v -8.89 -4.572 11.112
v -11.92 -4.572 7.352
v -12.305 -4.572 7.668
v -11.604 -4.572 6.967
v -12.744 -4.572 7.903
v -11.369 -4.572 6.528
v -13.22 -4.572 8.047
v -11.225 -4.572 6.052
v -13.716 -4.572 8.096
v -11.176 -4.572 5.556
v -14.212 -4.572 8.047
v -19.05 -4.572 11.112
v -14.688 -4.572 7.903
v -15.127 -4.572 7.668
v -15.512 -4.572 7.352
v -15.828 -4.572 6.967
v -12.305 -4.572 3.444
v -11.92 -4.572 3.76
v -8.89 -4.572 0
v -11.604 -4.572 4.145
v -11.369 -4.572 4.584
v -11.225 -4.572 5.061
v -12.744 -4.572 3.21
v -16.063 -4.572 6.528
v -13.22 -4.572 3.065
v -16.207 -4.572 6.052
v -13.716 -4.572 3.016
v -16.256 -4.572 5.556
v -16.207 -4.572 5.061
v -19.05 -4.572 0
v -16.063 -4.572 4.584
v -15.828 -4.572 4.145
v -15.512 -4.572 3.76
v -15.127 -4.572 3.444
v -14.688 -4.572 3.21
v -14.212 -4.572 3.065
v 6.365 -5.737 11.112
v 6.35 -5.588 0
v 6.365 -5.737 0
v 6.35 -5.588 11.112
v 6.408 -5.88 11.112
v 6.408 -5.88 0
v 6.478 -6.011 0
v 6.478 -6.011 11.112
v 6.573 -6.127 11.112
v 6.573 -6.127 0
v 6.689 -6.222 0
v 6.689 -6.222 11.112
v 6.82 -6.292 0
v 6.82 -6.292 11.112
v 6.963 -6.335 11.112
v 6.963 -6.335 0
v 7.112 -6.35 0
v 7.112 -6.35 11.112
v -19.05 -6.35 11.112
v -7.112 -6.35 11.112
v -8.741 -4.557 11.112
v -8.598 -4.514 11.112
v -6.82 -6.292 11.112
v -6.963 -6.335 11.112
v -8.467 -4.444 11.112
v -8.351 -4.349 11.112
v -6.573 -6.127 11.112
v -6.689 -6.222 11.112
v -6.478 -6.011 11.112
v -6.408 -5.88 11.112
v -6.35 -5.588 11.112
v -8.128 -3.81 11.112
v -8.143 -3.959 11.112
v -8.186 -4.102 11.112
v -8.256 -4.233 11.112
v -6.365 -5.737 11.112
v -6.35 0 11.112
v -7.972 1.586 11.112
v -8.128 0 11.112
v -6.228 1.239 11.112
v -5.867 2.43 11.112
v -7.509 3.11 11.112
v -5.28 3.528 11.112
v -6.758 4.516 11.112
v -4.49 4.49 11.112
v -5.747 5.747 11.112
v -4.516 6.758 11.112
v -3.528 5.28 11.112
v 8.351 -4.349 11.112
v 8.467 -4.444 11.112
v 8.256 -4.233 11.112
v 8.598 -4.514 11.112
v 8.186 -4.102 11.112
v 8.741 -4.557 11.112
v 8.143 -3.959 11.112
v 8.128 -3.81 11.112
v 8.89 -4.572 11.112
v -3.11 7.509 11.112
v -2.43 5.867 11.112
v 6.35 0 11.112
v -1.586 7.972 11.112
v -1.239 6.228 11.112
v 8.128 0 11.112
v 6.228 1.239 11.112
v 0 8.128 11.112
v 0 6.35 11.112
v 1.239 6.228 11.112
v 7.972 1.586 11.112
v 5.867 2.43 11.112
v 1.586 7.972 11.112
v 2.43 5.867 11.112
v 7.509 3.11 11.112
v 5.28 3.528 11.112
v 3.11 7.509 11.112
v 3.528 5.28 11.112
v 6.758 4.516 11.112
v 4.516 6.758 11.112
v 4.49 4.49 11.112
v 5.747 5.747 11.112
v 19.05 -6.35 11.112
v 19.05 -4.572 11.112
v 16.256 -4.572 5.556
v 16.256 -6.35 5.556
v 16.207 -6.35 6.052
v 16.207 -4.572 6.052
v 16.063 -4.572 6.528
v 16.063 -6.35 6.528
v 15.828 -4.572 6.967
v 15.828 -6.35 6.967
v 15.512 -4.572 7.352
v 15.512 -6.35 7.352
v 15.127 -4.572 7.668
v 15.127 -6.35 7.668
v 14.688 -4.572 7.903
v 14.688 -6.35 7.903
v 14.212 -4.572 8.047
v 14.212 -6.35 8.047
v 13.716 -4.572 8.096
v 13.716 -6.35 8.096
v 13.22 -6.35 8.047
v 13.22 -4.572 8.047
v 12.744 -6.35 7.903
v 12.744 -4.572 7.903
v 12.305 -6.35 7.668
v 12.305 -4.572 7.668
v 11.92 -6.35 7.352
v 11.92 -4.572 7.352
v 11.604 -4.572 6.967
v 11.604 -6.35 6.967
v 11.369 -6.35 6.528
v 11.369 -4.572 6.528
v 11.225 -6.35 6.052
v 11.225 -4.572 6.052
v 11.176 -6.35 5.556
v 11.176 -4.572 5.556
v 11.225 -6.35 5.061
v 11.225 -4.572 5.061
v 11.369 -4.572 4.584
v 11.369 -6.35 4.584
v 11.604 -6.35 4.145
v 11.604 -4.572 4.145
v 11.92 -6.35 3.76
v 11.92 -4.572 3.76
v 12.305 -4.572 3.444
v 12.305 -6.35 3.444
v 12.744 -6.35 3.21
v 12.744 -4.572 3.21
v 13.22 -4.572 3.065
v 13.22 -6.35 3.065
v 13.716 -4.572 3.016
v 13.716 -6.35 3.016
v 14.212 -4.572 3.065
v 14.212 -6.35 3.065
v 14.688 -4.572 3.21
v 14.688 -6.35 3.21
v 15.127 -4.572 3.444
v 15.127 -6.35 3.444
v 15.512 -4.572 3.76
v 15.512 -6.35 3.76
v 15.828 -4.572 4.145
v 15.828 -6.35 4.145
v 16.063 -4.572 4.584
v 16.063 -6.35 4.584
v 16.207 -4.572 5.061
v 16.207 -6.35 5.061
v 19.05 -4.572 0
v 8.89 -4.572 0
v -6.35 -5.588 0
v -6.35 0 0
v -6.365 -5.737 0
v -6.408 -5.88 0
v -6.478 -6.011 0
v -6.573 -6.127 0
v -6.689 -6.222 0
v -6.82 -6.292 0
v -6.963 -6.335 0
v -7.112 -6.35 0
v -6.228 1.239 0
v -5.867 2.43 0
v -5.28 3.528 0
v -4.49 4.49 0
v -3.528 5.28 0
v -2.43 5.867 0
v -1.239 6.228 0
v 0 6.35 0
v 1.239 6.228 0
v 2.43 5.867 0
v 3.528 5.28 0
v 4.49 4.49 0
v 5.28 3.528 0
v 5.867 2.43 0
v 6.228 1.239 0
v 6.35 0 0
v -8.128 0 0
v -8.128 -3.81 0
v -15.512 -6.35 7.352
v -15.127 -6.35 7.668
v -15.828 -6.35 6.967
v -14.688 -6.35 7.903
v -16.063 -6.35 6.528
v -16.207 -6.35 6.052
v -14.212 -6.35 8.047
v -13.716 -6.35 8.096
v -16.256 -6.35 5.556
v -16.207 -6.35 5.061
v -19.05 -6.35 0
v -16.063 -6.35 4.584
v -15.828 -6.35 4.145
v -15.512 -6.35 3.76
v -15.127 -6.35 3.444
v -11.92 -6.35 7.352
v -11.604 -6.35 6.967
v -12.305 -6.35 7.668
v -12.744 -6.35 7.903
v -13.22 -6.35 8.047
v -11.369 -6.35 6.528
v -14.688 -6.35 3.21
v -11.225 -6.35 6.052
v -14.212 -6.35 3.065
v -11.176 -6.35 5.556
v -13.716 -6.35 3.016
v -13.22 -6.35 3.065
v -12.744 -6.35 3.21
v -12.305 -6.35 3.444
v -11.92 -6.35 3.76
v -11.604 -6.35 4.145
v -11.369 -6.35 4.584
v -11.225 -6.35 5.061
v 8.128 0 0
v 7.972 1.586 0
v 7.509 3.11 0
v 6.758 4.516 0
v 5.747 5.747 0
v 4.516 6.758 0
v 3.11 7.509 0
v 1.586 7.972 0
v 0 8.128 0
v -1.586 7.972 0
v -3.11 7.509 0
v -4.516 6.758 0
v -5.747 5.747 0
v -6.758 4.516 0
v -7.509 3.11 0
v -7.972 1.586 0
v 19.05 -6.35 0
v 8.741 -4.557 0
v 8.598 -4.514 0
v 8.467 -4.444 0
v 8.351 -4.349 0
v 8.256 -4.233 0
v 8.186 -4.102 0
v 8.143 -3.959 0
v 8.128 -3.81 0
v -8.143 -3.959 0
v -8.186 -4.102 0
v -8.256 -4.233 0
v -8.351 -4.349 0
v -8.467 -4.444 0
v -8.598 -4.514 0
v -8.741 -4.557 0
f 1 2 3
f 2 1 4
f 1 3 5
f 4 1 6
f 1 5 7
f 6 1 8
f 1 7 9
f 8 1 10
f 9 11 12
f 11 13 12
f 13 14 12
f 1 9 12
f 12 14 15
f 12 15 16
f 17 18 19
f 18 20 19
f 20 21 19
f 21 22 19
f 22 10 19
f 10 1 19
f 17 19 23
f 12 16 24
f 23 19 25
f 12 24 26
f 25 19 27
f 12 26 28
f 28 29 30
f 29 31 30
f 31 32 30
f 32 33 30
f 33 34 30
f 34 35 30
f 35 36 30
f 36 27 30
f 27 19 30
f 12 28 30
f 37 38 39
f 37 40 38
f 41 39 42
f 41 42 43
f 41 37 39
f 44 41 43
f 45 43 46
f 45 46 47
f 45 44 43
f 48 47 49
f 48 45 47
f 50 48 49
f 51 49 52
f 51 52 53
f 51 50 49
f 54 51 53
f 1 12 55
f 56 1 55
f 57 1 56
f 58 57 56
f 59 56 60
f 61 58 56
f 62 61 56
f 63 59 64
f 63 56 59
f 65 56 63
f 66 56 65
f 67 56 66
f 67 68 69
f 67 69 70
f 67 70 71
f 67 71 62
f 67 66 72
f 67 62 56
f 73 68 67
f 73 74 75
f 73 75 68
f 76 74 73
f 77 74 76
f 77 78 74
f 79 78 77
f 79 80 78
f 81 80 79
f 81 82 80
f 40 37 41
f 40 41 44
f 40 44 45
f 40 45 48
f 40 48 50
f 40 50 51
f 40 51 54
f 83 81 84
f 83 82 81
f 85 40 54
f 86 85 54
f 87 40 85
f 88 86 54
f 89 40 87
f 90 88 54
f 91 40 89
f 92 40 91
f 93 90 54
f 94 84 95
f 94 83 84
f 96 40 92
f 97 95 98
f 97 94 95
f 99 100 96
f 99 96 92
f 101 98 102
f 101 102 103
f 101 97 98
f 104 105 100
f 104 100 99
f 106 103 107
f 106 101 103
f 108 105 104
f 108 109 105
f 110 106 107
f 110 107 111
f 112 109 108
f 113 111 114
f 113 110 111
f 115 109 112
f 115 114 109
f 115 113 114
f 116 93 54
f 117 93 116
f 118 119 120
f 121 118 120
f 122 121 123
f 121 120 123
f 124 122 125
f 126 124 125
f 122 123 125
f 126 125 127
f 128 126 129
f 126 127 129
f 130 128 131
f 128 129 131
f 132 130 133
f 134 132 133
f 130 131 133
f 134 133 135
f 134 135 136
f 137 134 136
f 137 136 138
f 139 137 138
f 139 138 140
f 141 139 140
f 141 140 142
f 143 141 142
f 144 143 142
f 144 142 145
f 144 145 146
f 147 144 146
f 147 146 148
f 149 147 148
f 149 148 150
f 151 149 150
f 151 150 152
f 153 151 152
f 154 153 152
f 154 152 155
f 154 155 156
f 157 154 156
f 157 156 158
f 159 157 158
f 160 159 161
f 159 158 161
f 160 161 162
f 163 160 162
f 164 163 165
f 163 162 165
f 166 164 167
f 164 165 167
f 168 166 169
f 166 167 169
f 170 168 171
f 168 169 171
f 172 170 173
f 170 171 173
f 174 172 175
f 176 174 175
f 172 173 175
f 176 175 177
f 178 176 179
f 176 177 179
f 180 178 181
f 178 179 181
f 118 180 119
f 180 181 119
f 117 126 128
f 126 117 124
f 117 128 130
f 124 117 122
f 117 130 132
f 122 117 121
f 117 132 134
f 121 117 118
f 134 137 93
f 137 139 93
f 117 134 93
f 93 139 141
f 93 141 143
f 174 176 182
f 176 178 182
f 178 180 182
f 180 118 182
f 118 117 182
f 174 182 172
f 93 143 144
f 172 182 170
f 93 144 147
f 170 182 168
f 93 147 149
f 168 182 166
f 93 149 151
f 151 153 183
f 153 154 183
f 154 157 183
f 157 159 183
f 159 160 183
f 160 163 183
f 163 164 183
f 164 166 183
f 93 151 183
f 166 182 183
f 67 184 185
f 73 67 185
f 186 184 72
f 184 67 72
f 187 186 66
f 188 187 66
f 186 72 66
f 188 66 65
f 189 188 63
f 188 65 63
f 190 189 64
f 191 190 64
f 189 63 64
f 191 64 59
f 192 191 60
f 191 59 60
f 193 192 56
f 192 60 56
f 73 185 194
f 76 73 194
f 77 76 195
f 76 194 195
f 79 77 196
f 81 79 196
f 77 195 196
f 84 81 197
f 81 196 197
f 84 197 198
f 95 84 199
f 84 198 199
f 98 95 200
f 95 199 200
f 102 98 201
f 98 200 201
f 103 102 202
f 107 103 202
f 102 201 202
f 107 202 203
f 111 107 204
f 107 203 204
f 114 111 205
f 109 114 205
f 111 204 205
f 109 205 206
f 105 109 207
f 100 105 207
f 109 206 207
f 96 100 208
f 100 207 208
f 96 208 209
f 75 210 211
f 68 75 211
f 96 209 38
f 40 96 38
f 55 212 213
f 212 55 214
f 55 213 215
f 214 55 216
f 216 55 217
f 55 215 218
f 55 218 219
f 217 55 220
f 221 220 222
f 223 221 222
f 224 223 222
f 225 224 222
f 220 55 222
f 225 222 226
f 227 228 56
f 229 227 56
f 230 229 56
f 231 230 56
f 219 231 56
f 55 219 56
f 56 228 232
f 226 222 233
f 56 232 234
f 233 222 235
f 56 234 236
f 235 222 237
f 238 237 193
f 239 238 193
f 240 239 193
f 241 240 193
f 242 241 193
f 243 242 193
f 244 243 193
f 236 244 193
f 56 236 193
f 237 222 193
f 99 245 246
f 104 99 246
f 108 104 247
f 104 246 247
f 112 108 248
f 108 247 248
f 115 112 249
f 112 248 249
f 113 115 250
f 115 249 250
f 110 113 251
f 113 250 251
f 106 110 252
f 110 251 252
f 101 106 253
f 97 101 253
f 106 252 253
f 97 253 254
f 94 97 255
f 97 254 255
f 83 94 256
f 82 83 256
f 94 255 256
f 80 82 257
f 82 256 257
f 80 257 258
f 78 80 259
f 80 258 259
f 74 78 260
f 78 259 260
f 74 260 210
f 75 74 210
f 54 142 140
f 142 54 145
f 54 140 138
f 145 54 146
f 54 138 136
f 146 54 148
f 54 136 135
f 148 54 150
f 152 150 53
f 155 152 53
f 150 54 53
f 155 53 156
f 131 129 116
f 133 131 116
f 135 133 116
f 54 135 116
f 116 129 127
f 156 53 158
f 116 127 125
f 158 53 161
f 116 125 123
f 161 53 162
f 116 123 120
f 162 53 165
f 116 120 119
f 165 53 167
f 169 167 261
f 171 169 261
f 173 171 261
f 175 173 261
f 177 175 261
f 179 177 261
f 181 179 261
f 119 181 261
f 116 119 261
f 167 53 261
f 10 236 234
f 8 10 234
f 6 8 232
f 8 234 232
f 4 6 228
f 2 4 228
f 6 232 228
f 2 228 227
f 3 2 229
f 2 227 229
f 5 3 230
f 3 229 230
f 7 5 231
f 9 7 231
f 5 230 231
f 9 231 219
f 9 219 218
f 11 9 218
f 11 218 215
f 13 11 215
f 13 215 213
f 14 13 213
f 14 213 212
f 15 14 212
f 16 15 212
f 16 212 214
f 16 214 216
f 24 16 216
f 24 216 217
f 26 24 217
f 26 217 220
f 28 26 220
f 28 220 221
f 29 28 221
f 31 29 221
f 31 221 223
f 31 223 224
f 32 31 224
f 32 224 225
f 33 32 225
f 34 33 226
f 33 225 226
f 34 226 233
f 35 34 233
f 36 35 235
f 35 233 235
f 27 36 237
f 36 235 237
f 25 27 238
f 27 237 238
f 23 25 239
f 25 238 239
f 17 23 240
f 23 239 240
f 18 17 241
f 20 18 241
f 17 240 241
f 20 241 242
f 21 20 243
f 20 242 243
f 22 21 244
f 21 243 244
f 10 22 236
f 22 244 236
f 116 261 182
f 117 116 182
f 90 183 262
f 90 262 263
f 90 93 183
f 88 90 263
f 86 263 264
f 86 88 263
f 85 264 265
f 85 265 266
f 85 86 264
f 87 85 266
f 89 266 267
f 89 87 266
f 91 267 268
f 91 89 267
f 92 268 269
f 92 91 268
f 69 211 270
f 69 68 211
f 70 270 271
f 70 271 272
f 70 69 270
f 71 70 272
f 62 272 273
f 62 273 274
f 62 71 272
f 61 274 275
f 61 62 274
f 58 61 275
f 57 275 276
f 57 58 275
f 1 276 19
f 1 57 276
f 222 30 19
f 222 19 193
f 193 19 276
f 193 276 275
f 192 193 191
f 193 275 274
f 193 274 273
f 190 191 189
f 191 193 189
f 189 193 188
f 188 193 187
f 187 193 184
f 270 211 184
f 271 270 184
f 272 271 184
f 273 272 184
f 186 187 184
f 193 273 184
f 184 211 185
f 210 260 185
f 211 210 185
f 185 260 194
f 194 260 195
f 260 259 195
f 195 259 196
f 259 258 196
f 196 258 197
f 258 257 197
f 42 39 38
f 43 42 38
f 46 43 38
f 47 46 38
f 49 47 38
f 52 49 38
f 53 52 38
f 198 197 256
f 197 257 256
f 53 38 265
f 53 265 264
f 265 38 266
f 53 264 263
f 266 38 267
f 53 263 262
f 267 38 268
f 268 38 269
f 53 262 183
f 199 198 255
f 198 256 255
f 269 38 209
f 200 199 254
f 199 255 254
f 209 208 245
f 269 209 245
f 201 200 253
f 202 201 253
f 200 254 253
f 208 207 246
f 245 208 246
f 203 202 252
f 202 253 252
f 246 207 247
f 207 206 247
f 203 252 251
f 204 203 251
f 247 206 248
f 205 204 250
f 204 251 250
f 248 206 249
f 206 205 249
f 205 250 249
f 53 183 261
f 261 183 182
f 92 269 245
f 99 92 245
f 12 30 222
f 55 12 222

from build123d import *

# Parameters (mm, degrees)
F1_DEPTH = 11.1125
F2_R     = 0.762
F3_R     = 2.54
F4_DEPTH = 14.479


with BuildPart() as f1:
    # F0 (on Top) → F1 (new body)
    with BuildSketch(Plane.XY):
        with BuildLine():
            Line((-6.35, -6.35), (-6.35, 0))
            ThreePointArc((-6.35, 0), (0, 6.35), (6.35, 0))
            Line((6.35, 0), (6.35, -6.35))
            Line((6.35, -6.35), (19.05, -6.35))
            Line((19.05, -6.35), (19.05, -4.572))
            Line((19.05, -4.572), (8.128, -4.572))
            Line((8.128, -4.572), (8.128, 0))
            ThreePointArc((8.128, 0), (0, 8.128), (-8.128, 0))
            Line((-8.128, 0), (-8.128, -4.572))
            Line((-8.128, -4.572), (-19.05, -4.572))
            Line((-19.05, -4.572), (-19.05, -6.35))
            Line((-19.05, -6.35), (-6.35, -6.35))
        make_face()
    extrude(amount=F1_DEPTH)

    # F2
    f2_edges = [f1.edges().sort_by_distance(p)[0] for p in [
        (-6.35, -6.35, 5.55625),
        (6.35, -6.35, 5.55625),
        (8.128, -4.572, 5.55625),
        (-8.128, -4.572, 5.55625),
    ]]
    fillet(f2_edges, radius=F2_R)

    # F3 (on face) → F4 (cut, through all)
    with BuildSketch(Plane.XZ.offset(6.35)):
        with Locations((-13.716, 5.55625)):
            Circle(F3_R)
        with Locations((13.716, 5.55625)):
            Circle(F3_R)
    extrude(amount=-F4_DEPTH, mode=Mode.SUBTRACT)


solid = f1.part
